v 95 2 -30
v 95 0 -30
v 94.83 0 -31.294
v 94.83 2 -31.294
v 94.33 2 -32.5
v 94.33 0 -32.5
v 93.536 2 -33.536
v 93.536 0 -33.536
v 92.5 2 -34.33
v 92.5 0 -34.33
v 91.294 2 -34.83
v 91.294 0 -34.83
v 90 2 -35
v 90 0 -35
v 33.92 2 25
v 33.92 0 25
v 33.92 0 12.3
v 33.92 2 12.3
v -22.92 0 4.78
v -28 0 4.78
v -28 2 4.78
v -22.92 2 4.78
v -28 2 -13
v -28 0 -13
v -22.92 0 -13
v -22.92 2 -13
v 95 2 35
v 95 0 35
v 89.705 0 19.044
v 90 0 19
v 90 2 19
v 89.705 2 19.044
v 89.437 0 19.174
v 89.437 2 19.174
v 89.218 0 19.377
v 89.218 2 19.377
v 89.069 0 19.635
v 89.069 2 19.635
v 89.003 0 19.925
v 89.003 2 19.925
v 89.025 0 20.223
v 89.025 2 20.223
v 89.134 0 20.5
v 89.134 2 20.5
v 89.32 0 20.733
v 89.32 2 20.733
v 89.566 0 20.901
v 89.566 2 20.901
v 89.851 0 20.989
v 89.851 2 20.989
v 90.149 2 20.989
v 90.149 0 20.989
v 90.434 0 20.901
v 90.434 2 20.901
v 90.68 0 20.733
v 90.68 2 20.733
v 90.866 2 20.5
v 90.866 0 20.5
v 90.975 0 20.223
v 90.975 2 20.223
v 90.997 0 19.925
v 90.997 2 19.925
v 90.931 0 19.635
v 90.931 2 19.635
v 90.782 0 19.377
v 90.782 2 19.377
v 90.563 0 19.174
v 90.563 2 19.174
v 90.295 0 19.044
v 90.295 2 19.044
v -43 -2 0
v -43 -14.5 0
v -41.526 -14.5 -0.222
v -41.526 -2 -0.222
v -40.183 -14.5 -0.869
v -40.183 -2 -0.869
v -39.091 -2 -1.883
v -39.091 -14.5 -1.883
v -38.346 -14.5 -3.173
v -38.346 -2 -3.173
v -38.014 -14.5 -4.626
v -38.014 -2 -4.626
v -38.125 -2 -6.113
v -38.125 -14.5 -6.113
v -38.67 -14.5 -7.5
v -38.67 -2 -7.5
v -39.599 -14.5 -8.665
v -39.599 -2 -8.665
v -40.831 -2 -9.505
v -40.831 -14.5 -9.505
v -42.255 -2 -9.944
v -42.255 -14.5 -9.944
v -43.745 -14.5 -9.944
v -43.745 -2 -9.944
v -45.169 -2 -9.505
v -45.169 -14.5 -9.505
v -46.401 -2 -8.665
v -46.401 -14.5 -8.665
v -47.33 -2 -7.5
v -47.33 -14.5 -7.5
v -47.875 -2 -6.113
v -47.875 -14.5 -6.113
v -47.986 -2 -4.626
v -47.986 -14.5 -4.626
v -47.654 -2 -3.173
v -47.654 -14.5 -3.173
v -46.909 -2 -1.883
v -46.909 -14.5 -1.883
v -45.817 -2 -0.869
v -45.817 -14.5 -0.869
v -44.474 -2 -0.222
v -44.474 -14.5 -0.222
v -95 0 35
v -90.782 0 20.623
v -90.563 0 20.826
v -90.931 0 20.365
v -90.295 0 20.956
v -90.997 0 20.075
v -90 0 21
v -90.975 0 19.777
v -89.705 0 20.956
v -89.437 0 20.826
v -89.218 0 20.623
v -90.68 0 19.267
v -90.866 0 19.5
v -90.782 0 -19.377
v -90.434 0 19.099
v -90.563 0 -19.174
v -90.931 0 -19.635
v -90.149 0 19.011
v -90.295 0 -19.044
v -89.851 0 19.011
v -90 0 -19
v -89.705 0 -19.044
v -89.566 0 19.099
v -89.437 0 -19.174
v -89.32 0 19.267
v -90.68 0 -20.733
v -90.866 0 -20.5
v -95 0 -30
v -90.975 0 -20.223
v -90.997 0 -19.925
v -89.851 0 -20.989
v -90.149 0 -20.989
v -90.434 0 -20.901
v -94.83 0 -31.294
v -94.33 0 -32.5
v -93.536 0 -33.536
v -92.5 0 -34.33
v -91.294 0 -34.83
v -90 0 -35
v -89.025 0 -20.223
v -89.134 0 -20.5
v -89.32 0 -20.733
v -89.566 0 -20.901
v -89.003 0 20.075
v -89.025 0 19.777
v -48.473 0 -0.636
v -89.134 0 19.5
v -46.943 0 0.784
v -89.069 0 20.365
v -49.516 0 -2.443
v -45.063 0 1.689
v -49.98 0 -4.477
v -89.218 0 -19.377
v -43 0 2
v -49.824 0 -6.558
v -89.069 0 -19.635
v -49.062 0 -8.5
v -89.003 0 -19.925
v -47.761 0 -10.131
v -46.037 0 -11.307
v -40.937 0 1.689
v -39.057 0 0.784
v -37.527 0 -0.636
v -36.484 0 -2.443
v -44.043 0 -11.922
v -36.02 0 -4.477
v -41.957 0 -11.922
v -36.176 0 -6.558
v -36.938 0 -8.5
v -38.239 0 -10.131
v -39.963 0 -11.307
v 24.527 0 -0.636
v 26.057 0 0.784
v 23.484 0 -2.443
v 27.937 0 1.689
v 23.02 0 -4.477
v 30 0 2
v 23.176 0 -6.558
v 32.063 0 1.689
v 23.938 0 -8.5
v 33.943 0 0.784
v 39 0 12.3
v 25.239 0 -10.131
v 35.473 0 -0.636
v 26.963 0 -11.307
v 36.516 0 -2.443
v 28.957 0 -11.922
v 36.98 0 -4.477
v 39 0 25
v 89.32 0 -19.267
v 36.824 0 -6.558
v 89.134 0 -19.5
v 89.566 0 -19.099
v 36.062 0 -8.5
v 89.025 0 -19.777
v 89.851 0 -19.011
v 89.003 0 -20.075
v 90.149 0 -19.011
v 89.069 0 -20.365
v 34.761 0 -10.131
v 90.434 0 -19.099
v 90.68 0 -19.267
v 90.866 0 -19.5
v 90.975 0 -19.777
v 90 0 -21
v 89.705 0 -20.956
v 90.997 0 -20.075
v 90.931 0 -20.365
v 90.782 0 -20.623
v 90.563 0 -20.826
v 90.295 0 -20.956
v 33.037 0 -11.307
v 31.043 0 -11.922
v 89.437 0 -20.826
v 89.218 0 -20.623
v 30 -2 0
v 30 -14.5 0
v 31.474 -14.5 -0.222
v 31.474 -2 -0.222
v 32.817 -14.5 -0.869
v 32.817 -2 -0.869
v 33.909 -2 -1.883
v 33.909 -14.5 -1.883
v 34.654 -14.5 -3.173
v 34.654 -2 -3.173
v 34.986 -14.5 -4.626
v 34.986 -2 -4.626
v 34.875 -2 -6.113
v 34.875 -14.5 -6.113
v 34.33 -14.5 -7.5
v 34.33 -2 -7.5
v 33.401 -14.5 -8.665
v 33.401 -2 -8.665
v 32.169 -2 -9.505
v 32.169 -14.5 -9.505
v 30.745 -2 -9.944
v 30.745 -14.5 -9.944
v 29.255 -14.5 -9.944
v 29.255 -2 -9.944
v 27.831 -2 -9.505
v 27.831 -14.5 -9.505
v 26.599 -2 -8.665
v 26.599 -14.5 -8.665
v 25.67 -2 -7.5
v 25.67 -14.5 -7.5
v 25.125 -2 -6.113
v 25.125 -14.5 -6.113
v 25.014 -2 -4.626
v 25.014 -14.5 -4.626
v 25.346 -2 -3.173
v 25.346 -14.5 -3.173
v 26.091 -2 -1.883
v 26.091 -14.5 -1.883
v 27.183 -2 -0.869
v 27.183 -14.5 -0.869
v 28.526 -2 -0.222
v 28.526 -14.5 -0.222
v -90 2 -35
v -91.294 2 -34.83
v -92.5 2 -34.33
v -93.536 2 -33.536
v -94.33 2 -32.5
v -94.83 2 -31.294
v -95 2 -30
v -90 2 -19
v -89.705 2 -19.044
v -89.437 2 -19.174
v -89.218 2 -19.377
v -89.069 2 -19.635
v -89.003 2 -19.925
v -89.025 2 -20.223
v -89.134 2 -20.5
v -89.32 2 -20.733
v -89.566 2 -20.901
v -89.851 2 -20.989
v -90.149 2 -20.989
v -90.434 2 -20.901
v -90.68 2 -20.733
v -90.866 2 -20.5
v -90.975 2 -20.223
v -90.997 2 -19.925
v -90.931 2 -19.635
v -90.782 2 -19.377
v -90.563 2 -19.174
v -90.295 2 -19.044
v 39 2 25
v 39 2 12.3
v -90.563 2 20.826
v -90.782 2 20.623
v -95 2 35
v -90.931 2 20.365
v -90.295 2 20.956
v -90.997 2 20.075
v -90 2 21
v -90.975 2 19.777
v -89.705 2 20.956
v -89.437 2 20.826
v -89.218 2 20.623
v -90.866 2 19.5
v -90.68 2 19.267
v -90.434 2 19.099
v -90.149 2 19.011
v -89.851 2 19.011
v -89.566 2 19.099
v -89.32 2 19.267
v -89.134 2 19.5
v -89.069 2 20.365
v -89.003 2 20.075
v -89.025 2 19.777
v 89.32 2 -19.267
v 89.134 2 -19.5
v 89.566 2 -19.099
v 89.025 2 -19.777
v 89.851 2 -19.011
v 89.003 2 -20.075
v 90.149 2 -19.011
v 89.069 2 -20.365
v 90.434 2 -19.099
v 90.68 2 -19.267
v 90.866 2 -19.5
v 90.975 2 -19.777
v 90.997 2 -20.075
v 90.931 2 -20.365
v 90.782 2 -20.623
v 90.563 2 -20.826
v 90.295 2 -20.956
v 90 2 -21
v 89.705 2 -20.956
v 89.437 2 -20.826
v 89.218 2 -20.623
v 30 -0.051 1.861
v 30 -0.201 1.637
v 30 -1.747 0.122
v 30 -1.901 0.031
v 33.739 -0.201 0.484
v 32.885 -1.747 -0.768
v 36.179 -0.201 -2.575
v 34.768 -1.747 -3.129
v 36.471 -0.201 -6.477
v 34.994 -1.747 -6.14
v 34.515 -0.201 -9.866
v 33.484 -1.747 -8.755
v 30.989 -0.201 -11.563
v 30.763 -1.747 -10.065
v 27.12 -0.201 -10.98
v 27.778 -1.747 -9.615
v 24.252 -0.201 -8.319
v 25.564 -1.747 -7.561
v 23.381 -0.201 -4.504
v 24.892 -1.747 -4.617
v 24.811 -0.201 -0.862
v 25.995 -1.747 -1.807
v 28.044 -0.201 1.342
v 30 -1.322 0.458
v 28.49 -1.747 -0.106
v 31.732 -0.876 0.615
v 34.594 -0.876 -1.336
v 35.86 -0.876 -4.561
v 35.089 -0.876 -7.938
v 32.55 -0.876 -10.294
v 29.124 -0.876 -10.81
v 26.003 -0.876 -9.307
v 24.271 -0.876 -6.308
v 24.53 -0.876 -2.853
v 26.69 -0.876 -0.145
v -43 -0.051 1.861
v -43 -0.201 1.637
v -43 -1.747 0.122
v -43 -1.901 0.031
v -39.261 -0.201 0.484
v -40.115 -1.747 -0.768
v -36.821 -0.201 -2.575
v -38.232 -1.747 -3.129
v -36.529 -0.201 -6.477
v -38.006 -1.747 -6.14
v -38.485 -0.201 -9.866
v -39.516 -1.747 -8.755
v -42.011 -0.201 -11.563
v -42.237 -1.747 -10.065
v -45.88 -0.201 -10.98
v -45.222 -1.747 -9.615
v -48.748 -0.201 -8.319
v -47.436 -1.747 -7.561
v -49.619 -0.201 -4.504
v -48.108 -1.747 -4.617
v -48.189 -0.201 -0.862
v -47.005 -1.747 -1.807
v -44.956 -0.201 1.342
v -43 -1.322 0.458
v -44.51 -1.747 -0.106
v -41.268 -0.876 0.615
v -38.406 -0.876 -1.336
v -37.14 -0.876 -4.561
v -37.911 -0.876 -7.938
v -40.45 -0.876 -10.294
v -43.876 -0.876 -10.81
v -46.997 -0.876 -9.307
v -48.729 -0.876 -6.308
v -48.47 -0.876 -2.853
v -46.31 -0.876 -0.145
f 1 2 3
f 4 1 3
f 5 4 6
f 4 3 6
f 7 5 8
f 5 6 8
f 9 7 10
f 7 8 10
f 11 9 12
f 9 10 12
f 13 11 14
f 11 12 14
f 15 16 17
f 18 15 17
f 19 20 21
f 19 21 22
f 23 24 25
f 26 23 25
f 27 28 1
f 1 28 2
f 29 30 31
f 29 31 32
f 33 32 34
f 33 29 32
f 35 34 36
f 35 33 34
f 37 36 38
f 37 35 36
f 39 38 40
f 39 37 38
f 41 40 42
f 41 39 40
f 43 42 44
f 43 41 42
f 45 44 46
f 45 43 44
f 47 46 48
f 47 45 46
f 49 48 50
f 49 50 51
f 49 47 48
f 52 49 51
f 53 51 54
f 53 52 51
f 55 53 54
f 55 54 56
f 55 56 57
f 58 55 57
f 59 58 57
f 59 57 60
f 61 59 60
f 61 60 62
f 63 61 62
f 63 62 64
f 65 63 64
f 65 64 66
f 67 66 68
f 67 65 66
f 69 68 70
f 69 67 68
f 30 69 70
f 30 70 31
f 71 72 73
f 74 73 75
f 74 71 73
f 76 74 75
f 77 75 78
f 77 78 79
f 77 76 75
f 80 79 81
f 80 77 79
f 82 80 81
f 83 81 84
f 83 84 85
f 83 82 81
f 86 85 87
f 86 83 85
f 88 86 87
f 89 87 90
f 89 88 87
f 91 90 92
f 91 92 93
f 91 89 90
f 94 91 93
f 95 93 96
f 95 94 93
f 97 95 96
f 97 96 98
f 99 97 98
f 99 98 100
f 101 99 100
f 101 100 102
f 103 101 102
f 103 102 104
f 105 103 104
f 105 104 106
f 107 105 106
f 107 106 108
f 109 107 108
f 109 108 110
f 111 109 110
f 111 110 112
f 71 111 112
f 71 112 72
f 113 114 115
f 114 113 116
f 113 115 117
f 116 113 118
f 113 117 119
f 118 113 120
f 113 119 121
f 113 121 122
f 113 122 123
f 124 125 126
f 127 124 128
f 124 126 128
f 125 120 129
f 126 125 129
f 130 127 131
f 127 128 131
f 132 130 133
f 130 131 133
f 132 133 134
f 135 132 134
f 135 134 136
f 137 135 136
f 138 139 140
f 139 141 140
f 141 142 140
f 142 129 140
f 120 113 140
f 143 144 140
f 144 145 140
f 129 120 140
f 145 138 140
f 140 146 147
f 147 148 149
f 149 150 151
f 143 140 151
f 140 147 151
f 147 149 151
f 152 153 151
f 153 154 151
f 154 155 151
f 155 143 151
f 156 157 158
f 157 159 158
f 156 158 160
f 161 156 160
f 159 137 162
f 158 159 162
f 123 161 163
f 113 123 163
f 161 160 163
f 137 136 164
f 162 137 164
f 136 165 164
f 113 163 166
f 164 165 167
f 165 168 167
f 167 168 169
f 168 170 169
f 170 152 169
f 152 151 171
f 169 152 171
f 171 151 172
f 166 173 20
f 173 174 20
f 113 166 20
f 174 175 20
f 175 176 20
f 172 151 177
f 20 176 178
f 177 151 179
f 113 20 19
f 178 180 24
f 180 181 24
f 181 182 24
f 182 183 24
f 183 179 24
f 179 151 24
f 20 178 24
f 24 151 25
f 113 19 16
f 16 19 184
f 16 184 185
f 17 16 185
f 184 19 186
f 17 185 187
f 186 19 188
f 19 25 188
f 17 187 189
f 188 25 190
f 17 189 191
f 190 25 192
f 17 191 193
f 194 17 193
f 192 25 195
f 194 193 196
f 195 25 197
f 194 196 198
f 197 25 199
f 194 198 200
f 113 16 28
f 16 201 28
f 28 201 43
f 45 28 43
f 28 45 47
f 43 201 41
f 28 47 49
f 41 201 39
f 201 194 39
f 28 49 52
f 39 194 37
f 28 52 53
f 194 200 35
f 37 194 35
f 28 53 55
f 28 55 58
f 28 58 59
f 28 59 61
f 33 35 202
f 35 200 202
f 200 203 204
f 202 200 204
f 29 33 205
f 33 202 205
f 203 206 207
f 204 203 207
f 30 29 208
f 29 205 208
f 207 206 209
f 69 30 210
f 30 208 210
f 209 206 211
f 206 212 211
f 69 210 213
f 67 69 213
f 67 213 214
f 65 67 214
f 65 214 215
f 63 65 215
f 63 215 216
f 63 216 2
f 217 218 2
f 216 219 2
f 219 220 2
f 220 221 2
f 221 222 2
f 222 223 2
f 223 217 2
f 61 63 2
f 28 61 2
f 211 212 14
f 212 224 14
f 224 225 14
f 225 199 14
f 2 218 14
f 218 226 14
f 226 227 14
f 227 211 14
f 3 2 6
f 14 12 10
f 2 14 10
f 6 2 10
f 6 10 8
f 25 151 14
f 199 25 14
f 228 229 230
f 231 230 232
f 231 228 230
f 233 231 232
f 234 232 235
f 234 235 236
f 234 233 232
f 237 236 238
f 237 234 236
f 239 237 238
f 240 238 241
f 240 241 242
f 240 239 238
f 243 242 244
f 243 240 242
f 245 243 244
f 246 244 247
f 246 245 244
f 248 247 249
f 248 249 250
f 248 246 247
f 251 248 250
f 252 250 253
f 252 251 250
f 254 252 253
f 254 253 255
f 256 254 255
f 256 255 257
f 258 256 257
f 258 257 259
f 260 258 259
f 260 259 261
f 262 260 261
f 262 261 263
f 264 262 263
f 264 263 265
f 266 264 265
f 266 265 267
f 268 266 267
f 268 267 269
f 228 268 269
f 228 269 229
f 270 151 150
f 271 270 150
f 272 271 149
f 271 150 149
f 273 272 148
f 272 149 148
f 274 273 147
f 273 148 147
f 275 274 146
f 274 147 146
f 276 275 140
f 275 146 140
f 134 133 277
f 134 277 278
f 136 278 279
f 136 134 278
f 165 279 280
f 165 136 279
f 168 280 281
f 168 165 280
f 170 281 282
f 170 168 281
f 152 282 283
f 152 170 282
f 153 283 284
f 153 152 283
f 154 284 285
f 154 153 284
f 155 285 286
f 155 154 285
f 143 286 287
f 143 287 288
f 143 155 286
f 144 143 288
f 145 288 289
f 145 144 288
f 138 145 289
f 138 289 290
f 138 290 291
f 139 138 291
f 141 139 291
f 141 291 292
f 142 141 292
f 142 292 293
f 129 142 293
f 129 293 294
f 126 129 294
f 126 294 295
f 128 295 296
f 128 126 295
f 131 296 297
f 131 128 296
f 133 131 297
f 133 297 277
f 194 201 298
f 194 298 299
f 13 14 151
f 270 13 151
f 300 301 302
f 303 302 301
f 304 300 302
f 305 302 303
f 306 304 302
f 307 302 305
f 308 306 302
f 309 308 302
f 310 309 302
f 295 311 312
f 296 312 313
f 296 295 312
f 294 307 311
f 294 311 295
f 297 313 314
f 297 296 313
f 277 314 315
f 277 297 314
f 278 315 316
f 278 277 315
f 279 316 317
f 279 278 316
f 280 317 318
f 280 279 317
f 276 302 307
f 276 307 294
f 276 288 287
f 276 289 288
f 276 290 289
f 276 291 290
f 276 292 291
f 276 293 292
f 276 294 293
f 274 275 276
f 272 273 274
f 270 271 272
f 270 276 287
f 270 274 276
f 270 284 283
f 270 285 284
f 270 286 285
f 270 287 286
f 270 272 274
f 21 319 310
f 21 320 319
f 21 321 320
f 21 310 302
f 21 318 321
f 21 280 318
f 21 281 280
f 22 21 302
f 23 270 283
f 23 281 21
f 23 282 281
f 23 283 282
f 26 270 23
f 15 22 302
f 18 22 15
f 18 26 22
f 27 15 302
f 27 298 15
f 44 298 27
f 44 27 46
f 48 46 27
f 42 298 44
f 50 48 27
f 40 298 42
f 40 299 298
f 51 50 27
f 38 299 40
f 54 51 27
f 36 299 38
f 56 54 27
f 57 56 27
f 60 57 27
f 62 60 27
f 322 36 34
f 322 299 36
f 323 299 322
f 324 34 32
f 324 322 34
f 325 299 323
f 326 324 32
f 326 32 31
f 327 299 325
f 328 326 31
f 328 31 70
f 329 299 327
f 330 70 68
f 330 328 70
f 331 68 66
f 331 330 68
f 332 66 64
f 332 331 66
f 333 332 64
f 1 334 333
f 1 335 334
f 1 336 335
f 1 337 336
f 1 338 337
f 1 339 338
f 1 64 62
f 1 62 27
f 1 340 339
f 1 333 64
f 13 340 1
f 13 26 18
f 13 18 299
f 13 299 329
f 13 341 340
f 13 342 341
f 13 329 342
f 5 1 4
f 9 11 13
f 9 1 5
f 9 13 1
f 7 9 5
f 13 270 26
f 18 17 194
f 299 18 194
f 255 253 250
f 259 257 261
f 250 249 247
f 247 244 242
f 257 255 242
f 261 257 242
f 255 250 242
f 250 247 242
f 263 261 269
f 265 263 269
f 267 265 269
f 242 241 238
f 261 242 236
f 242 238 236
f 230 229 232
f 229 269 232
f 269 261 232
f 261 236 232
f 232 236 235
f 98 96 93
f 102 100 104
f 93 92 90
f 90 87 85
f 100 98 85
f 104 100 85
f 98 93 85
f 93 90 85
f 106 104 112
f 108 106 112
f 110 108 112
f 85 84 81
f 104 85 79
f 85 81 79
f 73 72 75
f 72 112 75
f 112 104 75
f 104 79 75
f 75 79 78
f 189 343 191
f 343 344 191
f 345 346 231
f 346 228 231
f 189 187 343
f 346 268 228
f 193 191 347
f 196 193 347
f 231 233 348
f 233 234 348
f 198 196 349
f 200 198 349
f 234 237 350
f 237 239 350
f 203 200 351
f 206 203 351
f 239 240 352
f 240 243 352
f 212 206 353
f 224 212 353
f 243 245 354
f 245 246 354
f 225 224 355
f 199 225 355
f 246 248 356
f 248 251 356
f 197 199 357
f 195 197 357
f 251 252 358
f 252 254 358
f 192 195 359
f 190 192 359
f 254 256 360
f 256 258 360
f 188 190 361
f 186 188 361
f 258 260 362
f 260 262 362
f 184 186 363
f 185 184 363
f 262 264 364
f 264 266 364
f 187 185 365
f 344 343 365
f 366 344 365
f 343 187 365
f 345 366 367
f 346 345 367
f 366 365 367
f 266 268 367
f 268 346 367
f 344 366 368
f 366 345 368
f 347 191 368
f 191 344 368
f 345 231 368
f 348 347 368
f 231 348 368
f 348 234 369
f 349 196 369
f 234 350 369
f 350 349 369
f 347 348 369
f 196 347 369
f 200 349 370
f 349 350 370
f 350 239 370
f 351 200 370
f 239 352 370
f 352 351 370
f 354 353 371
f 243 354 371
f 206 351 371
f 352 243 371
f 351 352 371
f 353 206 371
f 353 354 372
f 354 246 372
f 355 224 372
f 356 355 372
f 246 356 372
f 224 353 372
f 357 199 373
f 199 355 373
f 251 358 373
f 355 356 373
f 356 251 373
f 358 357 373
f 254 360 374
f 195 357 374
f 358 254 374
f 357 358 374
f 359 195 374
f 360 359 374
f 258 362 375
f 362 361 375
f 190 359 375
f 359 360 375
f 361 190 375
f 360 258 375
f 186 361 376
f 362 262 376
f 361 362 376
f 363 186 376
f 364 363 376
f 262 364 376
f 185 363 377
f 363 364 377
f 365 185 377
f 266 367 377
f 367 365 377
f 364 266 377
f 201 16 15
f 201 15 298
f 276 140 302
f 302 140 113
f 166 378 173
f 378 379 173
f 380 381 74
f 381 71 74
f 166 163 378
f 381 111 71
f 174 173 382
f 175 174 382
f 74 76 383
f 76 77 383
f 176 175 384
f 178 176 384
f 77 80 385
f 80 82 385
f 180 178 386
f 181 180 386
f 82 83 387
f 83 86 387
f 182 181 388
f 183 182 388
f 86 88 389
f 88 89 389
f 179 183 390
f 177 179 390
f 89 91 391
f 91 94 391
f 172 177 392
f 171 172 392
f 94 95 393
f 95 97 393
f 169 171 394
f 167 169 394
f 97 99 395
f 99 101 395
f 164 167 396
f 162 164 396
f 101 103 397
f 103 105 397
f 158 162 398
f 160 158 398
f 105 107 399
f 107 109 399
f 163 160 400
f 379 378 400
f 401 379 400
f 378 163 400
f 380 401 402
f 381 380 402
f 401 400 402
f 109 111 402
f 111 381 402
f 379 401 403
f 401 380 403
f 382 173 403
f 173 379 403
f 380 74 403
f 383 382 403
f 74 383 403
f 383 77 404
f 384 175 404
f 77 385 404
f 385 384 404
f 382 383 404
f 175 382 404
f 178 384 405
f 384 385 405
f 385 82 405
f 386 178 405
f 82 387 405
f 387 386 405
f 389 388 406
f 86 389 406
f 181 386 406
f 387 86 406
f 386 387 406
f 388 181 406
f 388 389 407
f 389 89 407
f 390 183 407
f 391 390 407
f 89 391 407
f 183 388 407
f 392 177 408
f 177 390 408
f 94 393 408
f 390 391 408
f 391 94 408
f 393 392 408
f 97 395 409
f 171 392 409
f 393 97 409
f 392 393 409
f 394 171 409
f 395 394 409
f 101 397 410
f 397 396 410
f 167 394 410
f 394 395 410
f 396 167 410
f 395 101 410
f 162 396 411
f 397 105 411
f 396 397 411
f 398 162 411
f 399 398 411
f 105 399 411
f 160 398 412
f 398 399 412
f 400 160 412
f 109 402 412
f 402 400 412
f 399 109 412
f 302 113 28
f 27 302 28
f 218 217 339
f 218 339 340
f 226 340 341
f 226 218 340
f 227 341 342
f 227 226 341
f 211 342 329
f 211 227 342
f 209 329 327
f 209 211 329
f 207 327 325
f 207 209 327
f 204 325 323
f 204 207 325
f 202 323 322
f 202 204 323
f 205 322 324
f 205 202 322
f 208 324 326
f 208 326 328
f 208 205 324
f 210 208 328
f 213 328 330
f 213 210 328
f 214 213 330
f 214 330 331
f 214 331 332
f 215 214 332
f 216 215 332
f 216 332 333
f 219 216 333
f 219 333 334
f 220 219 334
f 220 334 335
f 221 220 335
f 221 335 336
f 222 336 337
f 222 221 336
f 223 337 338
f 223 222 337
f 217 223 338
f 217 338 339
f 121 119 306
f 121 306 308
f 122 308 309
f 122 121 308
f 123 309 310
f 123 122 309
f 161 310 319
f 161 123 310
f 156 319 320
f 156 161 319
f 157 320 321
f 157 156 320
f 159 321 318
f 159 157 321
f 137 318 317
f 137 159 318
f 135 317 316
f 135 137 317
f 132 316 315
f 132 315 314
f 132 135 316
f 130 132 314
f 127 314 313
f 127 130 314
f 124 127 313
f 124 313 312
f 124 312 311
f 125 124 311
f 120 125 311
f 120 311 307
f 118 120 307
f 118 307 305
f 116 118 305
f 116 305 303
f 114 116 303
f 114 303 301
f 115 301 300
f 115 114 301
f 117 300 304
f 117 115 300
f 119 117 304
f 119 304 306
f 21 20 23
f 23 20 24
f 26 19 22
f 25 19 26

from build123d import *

# Parameters (mm, degrees)
SKETCH_1_R        = 1
SKETCH_1_W        = 5.08
SKETCH_1_H        = 12.7
SKETCH_1_H_2      = 17.78
EXTRUDE_583_DEPTH = 2
SKETCH_2_R        = 5
EXTRUDE_781_DEPTH = 14.5
FILLET_1_SIZE     = 2


with BuildPart() as part:
    # Эскиз1 → Extrude 583 (new body)
    with BuildSketch(Plane(origin=(0, 0, 0), x_dir=(1, 0, 0), z_dir=(0, 1, 0))):
        with BuildLine():
            Line((90, 35), (-90, 35))
            ThreePointArc((-90, 35), (-93.535533906, 33.535533906), (-95, 30))
            Line((-95, 30), (-95, -35))
            Line((-95, -35), (95, -35))
            Line((95, -35), (95, 30))
            ThreePointArc((95, 30), (93.535533906, 33.535533906), (90, 35))
        make_face()
        with Locations(Location((-90, 20, 0), (0, 0, 270))):
            Circle(SKETCH_1_R, mode=Mode.SUBTRACT)
        with Locations(Location((-90, -20, 0), (0, 0, 270))):
            Circle(SKETCH_1_R, mode=Mode.SUBTRACT)
        with Locations(Location((90, -20, 0), (0, 0, 90))):
            Circle(SKETCH_1_R, mode=Mode.SUBTRACT)
        with Locations(Location((90, 20, 0), (0, 0, 90))):
            Circle(SKETCH_1_R, mode=Mode.SUBTRACT)
        with Locations((36.46, -18.65)):
            Rectangle(SKETCH_1_W, SKETCH_1_H, mode=Mode.SUBTRACT)
        with Locations((-25.46, 4.11)):
            Rectangle(SKETCH_1_W, SKETCH_1_H_2, mode=Mode.SUBTRACT)
    extrude(amount=EXTRUDE_583_DEPTH)

    # Эскиз2 → Extrude 781 (add)
    with BuildSketch(Plane(origin=(0, 0, 0), x_dir=(1, 0, 0), z_dir=(0, 1, 0))):
        with Locations(Location((30, 5, 0), (0, 0, 270))):
            Circle(SKETCH_2_R)
        with Locations(Location((-43, 5, 0), (0, 0, 270))):
            Circle(SKETCH_2_R)
    extrude(amount=-EXTRUDE_781_DEPTH)

    # Скругление1
    # a fillet whose section is not a circle: 2 mm, written as the material it adds along each edge
    with BuildSketch(Plane(origin=(30, 0, -5), x_dir=(0, 0, 1), z_dir=(-1, 0, 0))) as fillet_1_piece_1:
        with BuildLine():
            Bezier((5 + FILLET_1_SIZE, 0), (5, 0), (5, -FILLET_1_SIZE), weights=[1, 0.141421356, 1])
            Line((5, -FILLET_1_SIZE), (5, 0))
            Line((5, 0), (5 + FILLET_1_SIZE, 0))
        make_face()
    revolve(axis=Axis((30, 0, -5), (0, 1, 0)))
    with BuildSketch(Plane(origin=(-43, 0, -5), x_dir=(0, 0, 1), z_dir=(-1, 0, 0))) as fillet_1_piece_2:
        with BuildLine():
            Bezier((5 + FILLET_1_SIZE, 0), (5, 0), (5, -FILLET_1_SIZE), weights=[1, 0.141421356, 1])
            Line((5, -FILLET_1_SIZE), (5, 0))
            Line((5, 0), (5 + FILLET_1_SIZE, 0))
        make_face()
    revolve(axis=Axis((-43, 0, -5), (0, 1, 0)))


solid = part.part
